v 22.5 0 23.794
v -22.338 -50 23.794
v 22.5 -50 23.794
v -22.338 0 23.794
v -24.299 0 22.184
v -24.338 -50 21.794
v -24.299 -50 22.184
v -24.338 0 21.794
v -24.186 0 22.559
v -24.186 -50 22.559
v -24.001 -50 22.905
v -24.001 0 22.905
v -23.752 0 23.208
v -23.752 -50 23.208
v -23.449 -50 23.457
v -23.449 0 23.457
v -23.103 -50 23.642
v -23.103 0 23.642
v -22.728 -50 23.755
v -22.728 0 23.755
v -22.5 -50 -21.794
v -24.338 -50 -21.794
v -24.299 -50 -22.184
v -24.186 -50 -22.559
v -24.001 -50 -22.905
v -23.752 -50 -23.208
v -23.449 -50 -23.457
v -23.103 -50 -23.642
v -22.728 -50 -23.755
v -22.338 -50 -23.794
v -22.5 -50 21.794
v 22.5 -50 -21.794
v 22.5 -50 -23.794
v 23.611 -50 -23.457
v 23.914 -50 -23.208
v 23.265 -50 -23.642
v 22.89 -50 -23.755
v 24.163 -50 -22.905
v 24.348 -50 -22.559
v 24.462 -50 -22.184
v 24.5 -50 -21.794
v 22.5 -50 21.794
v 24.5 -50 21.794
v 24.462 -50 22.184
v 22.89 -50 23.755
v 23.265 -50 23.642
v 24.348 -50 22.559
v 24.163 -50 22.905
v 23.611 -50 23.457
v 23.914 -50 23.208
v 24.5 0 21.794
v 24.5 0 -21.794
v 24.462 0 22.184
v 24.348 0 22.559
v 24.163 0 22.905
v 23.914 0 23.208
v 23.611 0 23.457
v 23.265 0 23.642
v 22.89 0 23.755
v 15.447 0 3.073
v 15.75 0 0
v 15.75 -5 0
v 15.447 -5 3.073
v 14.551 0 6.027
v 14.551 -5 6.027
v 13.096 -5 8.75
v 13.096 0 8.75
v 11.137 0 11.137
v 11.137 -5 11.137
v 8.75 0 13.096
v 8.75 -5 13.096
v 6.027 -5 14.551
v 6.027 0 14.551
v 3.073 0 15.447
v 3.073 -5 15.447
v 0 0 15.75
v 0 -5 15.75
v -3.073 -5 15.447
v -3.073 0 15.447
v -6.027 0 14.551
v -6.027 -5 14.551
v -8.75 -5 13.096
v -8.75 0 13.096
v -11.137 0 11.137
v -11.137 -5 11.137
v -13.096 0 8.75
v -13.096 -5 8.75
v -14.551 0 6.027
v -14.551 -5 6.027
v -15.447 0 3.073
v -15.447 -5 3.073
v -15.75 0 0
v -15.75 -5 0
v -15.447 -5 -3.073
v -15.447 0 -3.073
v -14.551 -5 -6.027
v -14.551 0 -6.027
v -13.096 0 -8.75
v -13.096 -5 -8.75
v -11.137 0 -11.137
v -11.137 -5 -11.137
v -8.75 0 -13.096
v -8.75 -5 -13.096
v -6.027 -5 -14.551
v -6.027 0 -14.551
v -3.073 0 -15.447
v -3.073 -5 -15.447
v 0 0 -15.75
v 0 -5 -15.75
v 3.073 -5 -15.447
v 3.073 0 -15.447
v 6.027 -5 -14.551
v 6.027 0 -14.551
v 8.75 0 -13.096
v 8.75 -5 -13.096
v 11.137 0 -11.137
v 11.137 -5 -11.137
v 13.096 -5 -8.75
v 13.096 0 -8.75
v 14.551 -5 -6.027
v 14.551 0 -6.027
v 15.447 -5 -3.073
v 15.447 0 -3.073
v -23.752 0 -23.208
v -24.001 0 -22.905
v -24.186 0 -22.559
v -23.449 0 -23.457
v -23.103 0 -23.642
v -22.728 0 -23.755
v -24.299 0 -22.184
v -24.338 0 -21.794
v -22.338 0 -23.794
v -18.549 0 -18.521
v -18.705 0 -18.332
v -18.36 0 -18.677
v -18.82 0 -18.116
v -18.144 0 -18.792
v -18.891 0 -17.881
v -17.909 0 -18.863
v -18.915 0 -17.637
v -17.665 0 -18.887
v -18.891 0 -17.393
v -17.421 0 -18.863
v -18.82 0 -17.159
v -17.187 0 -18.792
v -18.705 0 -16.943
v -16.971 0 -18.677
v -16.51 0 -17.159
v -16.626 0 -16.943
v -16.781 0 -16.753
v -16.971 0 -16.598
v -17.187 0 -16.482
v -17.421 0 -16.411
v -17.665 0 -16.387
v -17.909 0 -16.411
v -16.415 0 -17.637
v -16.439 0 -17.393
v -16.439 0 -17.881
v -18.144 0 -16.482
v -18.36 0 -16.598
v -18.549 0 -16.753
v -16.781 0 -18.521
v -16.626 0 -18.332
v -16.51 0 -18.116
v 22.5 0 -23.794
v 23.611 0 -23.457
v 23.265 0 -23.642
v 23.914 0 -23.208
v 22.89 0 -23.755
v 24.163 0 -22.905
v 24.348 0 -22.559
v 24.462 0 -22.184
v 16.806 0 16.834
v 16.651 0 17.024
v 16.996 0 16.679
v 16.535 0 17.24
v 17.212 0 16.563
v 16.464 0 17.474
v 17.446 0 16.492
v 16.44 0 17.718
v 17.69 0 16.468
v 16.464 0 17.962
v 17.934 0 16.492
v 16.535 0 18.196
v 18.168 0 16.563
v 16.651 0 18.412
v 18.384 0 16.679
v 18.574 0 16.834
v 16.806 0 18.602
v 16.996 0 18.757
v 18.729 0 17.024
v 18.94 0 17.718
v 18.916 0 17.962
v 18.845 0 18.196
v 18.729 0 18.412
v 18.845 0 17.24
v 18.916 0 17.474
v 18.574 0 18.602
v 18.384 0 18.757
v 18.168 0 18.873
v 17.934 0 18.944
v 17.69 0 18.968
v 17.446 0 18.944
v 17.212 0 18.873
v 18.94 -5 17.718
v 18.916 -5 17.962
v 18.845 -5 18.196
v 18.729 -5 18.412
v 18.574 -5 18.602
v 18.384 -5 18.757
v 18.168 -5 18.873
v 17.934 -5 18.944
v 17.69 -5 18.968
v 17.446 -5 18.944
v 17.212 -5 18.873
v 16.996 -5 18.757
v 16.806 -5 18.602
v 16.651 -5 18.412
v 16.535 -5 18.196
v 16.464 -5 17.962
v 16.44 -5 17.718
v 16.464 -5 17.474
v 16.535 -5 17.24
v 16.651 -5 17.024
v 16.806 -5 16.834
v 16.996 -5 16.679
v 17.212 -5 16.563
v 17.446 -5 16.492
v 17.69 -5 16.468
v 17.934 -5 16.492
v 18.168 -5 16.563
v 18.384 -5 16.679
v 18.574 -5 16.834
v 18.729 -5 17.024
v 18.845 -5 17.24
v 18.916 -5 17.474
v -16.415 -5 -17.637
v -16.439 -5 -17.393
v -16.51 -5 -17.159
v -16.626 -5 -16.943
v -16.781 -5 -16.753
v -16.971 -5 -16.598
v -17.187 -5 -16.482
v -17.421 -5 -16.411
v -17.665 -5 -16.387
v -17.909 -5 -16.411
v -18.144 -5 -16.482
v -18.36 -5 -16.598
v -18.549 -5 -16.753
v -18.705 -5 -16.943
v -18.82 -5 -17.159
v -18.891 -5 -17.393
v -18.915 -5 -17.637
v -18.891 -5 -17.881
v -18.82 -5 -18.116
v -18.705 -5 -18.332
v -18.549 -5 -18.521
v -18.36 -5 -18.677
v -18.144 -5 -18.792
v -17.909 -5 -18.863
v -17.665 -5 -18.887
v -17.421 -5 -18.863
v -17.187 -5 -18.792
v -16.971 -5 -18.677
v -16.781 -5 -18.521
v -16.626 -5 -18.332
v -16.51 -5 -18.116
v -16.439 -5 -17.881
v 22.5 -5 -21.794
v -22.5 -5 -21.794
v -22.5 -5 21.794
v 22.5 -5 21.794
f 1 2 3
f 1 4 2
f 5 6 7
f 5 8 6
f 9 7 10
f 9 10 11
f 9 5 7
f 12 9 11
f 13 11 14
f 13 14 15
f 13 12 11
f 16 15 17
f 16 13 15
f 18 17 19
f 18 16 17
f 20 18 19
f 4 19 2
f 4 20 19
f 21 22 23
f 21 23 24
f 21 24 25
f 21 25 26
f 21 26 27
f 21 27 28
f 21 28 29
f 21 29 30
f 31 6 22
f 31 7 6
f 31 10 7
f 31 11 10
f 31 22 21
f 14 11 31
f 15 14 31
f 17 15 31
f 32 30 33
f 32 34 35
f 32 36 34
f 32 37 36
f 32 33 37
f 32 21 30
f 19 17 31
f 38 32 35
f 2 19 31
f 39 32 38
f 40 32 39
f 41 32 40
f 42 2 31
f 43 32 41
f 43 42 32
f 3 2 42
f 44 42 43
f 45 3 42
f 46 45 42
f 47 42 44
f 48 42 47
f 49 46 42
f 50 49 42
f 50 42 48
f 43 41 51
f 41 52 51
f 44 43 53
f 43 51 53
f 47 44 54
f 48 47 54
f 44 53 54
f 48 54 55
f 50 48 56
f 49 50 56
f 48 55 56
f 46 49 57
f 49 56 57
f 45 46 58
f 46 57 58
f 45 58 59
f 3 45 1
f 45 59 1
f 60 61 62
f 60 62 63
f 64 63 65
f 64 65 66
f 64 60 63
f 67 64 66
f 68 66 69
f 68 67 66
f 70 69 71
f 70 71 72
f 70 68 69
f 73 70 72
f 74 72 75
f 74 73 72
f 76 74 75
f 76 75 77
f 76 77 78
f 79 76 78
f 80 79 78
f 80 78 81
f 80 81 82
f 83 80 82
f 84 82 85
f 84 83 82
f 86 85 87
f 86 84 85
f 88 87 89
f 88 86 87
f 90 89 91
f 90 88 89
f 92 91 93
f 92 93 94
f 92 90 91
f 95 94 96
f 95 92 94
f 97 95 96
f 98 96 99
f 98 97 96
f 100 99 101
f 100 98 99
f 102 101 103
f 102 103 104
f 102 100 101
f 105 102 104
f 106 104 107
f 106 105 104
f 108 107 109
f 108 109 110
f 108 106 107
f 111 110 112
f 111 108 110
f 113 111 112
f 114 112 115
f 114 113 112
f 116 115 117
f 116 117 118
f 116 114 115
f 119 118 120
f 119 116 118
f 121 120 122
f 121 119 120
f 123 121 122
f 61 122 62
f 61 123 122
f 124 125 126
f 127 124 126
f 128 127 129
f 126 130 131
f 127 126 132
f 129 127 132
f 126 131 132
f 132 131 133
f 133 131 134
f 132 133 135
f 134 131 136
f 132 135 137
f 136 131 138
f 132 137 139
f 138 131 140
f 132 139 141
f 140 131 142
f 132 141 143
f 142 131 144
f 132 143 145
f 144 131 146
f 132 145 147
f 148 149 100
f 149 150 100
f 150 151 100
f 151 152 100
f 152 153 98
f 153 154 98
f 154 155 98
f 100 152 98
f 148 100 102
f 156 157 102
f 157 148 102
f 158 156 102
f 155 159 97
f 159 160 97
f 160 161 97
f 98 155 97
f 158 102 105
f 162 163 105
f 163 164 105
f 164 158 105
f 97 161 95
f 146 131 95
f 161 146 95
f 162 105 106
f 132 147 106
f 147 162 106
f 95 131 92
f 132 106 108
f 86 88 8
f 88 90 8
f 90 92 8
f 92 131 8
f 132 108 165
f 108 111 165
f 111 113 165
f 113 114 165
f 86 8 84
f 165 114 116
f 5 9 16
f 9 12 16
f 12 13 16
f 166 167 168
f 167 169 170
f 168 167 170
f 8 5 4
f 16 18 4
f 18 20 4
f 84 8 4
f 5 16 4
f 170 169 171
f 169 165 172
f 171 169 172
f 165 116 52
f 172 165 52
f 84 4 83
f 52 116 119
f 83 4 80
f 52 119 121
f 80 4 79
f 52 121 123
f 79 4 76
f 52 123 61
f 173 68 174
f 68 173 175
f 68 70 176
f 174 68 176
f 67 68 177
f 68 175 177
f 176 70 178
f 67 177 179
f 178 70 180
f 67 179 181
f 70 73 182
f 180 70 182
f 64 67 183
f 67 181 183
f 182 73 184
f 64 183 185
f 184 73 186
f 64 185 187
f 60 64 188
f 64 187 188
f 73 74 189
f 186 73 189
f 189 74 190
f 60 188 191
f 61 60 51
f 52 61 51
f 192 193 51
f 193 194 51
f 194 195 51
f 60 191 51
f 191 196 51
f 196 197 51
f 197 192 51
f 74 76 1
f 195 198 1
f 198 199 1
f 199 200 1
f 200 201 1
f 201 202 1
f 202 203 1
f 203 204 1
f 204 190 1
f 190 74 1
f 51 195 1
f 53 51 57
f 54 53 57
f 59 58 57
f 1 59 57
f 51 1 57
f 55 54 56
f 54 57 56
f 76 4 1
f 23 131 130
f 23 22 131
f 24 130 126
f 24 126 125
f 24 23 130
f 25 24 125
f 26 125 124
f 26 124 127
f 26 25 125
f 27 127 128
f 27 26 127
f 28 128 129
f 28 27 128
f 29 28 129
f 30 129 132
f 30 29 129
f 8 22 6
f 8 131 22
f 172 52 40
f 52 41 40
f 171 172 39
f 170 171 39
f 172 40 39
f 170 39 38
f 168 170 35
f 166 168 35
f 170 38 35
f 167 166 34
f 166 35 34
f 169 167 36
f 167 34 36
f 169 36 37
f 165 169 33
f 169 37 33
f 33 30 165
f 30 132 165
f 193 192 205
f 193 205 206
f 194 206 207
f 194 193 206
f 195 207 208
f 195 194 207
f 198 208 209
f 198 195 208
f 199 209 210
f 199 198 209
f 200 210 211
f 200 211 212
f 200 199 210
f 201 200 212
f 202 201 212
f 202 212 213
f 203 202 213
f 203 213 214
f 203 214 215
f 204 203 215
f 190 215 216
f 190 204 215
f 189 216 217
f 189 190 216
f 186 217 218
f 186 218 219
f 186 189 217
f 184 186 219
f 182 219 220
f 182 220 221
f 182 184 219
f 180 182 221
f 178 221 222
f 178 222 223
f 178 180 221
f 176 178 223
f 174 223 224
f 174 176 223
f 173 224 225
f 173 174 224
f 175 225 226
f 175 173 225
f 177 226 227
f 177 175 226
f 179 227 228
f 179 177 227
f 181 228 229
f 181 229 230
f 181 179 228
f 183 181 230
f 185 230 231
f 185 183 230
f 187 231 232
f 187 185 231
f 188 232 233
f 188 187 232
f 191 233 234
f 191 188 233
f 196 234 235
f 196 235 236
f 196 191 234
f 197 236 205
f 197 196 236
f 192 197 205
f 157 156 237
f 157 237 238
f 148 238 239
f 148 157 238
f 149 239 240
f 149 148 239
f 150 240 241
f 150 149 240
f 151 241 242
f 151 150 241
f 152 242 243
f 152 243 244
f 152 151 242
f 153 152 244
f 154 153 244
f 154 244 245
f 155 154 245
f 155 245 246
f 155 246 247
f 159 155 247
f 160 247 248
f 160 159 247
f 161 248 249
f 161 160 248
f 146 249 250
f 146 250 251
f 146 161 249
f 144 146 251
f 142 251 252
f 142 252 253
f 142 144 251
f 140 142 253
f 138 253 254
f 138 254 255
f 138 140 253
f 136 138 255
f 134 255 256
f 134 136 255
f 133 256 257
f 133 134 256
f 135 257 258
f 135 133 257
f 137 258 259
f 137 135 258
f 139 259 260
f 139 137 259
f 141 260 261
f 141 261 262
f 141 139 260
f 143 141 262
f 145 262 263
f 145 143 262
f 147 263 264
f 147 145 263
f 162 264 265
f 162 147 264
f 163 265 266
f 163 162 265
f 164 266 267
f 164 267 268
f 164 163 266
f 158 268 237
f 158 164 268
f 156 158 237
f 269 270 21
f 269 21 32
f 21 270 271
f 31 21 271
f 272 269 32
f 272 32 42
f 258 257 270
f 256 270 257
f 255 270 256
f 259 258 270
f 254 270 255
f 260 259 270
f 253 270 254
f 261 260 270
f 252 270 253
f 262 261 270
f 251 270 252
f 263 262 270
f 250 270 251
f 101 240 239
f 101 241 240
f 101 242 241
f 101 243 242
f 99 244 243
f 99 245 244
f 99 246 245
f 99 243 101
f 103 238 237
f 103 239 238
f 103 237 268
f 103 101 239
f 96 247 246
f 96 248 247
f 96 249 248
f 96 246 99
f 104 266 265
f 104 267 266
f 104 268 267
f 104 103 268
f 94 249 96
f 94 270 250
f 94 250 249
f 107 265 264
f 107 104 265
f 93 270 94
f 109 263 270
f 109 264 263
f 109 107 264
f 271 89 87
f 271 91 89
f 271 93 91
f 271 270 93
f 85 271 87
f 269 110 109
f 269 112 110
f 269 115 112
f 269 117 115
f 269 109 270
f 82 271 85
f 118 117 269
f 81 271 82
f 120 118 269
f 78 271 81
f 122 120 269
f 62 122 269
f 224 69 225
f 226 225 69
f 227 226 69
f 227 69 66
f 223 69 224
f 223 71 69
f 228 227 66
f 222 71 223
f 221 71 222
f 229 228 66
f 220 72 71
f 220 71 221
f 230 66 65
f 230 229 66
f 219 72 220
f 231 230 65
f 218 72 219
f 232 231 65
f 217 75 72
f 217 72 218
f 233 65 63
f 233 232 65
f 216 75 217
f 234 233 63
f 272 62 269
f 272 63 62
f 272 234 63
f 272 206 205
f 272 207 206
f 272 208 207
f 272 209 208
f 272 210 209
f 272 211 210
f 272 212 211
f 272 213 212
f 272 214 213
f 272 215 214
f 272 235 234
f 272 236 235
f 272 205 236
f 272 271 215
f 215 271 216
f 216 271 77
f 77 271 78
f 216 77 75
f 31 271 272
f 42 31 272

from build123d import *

# Parameters (mm, degrees)
F2_W     = 48.837749362
F2_H     = 47.5878509101
F2_W_2   = 45
F2_H_2   = 43.5878502545
F2_R     = 1.25
F2_R_2   = 15.75
F3_DEPTH = 5
F4_DEPTH = 50
F5_R     = 2


with BuildPart() as f3:
    # F2 (on Front) → F3 (new body)
    with BuildSketch(Plane.XZ):
        with Locations((0.0811256468, 0)):
            Rectangle(F2_W, F2_H)
        Rectangle(F2_W_2, F2_H_2, mode=Mode.SUBTRACT)
        Rectangle(F2_W_2, F2_H_2)
        with Locations((-17.6653114055, -17.6373357058)):
            Circle(F2_R, mode=Mode.SUBTRACT)
        Circle(F2_R_2, mode=Mode.SUBTRACT)
        with Locations((17.6900276539, 17.7180033535)):
            Circle(F2_R, mode=Mode.SUBTRACT)
    extrude(amount=F3_DEPTH)

    # F2 (on Front) → F4 (join)
    with BuildSketch(Plane.XZ):
        with Locations((0.0811256468, 0)):
            Rectangle(F2_W, F2_H)
        Rectangle(F2_W_2, F2_H_2, mode=Mode.SUBTRACT)
    extrude(amount=F4_DEPTH)

    # F5
    f5_edges = [f3.edges().sort_by_distance(p)[0] for p in [
        (-24.337749, -25, 23.793925),
        (24.5, -25, 23.793925),
        (24.5, -25, -23.793925),
        (-24.337749, -25, -23.793925),
    ]]
    fillet(f5_edges, radius=F5_R)


solid = f3.part
